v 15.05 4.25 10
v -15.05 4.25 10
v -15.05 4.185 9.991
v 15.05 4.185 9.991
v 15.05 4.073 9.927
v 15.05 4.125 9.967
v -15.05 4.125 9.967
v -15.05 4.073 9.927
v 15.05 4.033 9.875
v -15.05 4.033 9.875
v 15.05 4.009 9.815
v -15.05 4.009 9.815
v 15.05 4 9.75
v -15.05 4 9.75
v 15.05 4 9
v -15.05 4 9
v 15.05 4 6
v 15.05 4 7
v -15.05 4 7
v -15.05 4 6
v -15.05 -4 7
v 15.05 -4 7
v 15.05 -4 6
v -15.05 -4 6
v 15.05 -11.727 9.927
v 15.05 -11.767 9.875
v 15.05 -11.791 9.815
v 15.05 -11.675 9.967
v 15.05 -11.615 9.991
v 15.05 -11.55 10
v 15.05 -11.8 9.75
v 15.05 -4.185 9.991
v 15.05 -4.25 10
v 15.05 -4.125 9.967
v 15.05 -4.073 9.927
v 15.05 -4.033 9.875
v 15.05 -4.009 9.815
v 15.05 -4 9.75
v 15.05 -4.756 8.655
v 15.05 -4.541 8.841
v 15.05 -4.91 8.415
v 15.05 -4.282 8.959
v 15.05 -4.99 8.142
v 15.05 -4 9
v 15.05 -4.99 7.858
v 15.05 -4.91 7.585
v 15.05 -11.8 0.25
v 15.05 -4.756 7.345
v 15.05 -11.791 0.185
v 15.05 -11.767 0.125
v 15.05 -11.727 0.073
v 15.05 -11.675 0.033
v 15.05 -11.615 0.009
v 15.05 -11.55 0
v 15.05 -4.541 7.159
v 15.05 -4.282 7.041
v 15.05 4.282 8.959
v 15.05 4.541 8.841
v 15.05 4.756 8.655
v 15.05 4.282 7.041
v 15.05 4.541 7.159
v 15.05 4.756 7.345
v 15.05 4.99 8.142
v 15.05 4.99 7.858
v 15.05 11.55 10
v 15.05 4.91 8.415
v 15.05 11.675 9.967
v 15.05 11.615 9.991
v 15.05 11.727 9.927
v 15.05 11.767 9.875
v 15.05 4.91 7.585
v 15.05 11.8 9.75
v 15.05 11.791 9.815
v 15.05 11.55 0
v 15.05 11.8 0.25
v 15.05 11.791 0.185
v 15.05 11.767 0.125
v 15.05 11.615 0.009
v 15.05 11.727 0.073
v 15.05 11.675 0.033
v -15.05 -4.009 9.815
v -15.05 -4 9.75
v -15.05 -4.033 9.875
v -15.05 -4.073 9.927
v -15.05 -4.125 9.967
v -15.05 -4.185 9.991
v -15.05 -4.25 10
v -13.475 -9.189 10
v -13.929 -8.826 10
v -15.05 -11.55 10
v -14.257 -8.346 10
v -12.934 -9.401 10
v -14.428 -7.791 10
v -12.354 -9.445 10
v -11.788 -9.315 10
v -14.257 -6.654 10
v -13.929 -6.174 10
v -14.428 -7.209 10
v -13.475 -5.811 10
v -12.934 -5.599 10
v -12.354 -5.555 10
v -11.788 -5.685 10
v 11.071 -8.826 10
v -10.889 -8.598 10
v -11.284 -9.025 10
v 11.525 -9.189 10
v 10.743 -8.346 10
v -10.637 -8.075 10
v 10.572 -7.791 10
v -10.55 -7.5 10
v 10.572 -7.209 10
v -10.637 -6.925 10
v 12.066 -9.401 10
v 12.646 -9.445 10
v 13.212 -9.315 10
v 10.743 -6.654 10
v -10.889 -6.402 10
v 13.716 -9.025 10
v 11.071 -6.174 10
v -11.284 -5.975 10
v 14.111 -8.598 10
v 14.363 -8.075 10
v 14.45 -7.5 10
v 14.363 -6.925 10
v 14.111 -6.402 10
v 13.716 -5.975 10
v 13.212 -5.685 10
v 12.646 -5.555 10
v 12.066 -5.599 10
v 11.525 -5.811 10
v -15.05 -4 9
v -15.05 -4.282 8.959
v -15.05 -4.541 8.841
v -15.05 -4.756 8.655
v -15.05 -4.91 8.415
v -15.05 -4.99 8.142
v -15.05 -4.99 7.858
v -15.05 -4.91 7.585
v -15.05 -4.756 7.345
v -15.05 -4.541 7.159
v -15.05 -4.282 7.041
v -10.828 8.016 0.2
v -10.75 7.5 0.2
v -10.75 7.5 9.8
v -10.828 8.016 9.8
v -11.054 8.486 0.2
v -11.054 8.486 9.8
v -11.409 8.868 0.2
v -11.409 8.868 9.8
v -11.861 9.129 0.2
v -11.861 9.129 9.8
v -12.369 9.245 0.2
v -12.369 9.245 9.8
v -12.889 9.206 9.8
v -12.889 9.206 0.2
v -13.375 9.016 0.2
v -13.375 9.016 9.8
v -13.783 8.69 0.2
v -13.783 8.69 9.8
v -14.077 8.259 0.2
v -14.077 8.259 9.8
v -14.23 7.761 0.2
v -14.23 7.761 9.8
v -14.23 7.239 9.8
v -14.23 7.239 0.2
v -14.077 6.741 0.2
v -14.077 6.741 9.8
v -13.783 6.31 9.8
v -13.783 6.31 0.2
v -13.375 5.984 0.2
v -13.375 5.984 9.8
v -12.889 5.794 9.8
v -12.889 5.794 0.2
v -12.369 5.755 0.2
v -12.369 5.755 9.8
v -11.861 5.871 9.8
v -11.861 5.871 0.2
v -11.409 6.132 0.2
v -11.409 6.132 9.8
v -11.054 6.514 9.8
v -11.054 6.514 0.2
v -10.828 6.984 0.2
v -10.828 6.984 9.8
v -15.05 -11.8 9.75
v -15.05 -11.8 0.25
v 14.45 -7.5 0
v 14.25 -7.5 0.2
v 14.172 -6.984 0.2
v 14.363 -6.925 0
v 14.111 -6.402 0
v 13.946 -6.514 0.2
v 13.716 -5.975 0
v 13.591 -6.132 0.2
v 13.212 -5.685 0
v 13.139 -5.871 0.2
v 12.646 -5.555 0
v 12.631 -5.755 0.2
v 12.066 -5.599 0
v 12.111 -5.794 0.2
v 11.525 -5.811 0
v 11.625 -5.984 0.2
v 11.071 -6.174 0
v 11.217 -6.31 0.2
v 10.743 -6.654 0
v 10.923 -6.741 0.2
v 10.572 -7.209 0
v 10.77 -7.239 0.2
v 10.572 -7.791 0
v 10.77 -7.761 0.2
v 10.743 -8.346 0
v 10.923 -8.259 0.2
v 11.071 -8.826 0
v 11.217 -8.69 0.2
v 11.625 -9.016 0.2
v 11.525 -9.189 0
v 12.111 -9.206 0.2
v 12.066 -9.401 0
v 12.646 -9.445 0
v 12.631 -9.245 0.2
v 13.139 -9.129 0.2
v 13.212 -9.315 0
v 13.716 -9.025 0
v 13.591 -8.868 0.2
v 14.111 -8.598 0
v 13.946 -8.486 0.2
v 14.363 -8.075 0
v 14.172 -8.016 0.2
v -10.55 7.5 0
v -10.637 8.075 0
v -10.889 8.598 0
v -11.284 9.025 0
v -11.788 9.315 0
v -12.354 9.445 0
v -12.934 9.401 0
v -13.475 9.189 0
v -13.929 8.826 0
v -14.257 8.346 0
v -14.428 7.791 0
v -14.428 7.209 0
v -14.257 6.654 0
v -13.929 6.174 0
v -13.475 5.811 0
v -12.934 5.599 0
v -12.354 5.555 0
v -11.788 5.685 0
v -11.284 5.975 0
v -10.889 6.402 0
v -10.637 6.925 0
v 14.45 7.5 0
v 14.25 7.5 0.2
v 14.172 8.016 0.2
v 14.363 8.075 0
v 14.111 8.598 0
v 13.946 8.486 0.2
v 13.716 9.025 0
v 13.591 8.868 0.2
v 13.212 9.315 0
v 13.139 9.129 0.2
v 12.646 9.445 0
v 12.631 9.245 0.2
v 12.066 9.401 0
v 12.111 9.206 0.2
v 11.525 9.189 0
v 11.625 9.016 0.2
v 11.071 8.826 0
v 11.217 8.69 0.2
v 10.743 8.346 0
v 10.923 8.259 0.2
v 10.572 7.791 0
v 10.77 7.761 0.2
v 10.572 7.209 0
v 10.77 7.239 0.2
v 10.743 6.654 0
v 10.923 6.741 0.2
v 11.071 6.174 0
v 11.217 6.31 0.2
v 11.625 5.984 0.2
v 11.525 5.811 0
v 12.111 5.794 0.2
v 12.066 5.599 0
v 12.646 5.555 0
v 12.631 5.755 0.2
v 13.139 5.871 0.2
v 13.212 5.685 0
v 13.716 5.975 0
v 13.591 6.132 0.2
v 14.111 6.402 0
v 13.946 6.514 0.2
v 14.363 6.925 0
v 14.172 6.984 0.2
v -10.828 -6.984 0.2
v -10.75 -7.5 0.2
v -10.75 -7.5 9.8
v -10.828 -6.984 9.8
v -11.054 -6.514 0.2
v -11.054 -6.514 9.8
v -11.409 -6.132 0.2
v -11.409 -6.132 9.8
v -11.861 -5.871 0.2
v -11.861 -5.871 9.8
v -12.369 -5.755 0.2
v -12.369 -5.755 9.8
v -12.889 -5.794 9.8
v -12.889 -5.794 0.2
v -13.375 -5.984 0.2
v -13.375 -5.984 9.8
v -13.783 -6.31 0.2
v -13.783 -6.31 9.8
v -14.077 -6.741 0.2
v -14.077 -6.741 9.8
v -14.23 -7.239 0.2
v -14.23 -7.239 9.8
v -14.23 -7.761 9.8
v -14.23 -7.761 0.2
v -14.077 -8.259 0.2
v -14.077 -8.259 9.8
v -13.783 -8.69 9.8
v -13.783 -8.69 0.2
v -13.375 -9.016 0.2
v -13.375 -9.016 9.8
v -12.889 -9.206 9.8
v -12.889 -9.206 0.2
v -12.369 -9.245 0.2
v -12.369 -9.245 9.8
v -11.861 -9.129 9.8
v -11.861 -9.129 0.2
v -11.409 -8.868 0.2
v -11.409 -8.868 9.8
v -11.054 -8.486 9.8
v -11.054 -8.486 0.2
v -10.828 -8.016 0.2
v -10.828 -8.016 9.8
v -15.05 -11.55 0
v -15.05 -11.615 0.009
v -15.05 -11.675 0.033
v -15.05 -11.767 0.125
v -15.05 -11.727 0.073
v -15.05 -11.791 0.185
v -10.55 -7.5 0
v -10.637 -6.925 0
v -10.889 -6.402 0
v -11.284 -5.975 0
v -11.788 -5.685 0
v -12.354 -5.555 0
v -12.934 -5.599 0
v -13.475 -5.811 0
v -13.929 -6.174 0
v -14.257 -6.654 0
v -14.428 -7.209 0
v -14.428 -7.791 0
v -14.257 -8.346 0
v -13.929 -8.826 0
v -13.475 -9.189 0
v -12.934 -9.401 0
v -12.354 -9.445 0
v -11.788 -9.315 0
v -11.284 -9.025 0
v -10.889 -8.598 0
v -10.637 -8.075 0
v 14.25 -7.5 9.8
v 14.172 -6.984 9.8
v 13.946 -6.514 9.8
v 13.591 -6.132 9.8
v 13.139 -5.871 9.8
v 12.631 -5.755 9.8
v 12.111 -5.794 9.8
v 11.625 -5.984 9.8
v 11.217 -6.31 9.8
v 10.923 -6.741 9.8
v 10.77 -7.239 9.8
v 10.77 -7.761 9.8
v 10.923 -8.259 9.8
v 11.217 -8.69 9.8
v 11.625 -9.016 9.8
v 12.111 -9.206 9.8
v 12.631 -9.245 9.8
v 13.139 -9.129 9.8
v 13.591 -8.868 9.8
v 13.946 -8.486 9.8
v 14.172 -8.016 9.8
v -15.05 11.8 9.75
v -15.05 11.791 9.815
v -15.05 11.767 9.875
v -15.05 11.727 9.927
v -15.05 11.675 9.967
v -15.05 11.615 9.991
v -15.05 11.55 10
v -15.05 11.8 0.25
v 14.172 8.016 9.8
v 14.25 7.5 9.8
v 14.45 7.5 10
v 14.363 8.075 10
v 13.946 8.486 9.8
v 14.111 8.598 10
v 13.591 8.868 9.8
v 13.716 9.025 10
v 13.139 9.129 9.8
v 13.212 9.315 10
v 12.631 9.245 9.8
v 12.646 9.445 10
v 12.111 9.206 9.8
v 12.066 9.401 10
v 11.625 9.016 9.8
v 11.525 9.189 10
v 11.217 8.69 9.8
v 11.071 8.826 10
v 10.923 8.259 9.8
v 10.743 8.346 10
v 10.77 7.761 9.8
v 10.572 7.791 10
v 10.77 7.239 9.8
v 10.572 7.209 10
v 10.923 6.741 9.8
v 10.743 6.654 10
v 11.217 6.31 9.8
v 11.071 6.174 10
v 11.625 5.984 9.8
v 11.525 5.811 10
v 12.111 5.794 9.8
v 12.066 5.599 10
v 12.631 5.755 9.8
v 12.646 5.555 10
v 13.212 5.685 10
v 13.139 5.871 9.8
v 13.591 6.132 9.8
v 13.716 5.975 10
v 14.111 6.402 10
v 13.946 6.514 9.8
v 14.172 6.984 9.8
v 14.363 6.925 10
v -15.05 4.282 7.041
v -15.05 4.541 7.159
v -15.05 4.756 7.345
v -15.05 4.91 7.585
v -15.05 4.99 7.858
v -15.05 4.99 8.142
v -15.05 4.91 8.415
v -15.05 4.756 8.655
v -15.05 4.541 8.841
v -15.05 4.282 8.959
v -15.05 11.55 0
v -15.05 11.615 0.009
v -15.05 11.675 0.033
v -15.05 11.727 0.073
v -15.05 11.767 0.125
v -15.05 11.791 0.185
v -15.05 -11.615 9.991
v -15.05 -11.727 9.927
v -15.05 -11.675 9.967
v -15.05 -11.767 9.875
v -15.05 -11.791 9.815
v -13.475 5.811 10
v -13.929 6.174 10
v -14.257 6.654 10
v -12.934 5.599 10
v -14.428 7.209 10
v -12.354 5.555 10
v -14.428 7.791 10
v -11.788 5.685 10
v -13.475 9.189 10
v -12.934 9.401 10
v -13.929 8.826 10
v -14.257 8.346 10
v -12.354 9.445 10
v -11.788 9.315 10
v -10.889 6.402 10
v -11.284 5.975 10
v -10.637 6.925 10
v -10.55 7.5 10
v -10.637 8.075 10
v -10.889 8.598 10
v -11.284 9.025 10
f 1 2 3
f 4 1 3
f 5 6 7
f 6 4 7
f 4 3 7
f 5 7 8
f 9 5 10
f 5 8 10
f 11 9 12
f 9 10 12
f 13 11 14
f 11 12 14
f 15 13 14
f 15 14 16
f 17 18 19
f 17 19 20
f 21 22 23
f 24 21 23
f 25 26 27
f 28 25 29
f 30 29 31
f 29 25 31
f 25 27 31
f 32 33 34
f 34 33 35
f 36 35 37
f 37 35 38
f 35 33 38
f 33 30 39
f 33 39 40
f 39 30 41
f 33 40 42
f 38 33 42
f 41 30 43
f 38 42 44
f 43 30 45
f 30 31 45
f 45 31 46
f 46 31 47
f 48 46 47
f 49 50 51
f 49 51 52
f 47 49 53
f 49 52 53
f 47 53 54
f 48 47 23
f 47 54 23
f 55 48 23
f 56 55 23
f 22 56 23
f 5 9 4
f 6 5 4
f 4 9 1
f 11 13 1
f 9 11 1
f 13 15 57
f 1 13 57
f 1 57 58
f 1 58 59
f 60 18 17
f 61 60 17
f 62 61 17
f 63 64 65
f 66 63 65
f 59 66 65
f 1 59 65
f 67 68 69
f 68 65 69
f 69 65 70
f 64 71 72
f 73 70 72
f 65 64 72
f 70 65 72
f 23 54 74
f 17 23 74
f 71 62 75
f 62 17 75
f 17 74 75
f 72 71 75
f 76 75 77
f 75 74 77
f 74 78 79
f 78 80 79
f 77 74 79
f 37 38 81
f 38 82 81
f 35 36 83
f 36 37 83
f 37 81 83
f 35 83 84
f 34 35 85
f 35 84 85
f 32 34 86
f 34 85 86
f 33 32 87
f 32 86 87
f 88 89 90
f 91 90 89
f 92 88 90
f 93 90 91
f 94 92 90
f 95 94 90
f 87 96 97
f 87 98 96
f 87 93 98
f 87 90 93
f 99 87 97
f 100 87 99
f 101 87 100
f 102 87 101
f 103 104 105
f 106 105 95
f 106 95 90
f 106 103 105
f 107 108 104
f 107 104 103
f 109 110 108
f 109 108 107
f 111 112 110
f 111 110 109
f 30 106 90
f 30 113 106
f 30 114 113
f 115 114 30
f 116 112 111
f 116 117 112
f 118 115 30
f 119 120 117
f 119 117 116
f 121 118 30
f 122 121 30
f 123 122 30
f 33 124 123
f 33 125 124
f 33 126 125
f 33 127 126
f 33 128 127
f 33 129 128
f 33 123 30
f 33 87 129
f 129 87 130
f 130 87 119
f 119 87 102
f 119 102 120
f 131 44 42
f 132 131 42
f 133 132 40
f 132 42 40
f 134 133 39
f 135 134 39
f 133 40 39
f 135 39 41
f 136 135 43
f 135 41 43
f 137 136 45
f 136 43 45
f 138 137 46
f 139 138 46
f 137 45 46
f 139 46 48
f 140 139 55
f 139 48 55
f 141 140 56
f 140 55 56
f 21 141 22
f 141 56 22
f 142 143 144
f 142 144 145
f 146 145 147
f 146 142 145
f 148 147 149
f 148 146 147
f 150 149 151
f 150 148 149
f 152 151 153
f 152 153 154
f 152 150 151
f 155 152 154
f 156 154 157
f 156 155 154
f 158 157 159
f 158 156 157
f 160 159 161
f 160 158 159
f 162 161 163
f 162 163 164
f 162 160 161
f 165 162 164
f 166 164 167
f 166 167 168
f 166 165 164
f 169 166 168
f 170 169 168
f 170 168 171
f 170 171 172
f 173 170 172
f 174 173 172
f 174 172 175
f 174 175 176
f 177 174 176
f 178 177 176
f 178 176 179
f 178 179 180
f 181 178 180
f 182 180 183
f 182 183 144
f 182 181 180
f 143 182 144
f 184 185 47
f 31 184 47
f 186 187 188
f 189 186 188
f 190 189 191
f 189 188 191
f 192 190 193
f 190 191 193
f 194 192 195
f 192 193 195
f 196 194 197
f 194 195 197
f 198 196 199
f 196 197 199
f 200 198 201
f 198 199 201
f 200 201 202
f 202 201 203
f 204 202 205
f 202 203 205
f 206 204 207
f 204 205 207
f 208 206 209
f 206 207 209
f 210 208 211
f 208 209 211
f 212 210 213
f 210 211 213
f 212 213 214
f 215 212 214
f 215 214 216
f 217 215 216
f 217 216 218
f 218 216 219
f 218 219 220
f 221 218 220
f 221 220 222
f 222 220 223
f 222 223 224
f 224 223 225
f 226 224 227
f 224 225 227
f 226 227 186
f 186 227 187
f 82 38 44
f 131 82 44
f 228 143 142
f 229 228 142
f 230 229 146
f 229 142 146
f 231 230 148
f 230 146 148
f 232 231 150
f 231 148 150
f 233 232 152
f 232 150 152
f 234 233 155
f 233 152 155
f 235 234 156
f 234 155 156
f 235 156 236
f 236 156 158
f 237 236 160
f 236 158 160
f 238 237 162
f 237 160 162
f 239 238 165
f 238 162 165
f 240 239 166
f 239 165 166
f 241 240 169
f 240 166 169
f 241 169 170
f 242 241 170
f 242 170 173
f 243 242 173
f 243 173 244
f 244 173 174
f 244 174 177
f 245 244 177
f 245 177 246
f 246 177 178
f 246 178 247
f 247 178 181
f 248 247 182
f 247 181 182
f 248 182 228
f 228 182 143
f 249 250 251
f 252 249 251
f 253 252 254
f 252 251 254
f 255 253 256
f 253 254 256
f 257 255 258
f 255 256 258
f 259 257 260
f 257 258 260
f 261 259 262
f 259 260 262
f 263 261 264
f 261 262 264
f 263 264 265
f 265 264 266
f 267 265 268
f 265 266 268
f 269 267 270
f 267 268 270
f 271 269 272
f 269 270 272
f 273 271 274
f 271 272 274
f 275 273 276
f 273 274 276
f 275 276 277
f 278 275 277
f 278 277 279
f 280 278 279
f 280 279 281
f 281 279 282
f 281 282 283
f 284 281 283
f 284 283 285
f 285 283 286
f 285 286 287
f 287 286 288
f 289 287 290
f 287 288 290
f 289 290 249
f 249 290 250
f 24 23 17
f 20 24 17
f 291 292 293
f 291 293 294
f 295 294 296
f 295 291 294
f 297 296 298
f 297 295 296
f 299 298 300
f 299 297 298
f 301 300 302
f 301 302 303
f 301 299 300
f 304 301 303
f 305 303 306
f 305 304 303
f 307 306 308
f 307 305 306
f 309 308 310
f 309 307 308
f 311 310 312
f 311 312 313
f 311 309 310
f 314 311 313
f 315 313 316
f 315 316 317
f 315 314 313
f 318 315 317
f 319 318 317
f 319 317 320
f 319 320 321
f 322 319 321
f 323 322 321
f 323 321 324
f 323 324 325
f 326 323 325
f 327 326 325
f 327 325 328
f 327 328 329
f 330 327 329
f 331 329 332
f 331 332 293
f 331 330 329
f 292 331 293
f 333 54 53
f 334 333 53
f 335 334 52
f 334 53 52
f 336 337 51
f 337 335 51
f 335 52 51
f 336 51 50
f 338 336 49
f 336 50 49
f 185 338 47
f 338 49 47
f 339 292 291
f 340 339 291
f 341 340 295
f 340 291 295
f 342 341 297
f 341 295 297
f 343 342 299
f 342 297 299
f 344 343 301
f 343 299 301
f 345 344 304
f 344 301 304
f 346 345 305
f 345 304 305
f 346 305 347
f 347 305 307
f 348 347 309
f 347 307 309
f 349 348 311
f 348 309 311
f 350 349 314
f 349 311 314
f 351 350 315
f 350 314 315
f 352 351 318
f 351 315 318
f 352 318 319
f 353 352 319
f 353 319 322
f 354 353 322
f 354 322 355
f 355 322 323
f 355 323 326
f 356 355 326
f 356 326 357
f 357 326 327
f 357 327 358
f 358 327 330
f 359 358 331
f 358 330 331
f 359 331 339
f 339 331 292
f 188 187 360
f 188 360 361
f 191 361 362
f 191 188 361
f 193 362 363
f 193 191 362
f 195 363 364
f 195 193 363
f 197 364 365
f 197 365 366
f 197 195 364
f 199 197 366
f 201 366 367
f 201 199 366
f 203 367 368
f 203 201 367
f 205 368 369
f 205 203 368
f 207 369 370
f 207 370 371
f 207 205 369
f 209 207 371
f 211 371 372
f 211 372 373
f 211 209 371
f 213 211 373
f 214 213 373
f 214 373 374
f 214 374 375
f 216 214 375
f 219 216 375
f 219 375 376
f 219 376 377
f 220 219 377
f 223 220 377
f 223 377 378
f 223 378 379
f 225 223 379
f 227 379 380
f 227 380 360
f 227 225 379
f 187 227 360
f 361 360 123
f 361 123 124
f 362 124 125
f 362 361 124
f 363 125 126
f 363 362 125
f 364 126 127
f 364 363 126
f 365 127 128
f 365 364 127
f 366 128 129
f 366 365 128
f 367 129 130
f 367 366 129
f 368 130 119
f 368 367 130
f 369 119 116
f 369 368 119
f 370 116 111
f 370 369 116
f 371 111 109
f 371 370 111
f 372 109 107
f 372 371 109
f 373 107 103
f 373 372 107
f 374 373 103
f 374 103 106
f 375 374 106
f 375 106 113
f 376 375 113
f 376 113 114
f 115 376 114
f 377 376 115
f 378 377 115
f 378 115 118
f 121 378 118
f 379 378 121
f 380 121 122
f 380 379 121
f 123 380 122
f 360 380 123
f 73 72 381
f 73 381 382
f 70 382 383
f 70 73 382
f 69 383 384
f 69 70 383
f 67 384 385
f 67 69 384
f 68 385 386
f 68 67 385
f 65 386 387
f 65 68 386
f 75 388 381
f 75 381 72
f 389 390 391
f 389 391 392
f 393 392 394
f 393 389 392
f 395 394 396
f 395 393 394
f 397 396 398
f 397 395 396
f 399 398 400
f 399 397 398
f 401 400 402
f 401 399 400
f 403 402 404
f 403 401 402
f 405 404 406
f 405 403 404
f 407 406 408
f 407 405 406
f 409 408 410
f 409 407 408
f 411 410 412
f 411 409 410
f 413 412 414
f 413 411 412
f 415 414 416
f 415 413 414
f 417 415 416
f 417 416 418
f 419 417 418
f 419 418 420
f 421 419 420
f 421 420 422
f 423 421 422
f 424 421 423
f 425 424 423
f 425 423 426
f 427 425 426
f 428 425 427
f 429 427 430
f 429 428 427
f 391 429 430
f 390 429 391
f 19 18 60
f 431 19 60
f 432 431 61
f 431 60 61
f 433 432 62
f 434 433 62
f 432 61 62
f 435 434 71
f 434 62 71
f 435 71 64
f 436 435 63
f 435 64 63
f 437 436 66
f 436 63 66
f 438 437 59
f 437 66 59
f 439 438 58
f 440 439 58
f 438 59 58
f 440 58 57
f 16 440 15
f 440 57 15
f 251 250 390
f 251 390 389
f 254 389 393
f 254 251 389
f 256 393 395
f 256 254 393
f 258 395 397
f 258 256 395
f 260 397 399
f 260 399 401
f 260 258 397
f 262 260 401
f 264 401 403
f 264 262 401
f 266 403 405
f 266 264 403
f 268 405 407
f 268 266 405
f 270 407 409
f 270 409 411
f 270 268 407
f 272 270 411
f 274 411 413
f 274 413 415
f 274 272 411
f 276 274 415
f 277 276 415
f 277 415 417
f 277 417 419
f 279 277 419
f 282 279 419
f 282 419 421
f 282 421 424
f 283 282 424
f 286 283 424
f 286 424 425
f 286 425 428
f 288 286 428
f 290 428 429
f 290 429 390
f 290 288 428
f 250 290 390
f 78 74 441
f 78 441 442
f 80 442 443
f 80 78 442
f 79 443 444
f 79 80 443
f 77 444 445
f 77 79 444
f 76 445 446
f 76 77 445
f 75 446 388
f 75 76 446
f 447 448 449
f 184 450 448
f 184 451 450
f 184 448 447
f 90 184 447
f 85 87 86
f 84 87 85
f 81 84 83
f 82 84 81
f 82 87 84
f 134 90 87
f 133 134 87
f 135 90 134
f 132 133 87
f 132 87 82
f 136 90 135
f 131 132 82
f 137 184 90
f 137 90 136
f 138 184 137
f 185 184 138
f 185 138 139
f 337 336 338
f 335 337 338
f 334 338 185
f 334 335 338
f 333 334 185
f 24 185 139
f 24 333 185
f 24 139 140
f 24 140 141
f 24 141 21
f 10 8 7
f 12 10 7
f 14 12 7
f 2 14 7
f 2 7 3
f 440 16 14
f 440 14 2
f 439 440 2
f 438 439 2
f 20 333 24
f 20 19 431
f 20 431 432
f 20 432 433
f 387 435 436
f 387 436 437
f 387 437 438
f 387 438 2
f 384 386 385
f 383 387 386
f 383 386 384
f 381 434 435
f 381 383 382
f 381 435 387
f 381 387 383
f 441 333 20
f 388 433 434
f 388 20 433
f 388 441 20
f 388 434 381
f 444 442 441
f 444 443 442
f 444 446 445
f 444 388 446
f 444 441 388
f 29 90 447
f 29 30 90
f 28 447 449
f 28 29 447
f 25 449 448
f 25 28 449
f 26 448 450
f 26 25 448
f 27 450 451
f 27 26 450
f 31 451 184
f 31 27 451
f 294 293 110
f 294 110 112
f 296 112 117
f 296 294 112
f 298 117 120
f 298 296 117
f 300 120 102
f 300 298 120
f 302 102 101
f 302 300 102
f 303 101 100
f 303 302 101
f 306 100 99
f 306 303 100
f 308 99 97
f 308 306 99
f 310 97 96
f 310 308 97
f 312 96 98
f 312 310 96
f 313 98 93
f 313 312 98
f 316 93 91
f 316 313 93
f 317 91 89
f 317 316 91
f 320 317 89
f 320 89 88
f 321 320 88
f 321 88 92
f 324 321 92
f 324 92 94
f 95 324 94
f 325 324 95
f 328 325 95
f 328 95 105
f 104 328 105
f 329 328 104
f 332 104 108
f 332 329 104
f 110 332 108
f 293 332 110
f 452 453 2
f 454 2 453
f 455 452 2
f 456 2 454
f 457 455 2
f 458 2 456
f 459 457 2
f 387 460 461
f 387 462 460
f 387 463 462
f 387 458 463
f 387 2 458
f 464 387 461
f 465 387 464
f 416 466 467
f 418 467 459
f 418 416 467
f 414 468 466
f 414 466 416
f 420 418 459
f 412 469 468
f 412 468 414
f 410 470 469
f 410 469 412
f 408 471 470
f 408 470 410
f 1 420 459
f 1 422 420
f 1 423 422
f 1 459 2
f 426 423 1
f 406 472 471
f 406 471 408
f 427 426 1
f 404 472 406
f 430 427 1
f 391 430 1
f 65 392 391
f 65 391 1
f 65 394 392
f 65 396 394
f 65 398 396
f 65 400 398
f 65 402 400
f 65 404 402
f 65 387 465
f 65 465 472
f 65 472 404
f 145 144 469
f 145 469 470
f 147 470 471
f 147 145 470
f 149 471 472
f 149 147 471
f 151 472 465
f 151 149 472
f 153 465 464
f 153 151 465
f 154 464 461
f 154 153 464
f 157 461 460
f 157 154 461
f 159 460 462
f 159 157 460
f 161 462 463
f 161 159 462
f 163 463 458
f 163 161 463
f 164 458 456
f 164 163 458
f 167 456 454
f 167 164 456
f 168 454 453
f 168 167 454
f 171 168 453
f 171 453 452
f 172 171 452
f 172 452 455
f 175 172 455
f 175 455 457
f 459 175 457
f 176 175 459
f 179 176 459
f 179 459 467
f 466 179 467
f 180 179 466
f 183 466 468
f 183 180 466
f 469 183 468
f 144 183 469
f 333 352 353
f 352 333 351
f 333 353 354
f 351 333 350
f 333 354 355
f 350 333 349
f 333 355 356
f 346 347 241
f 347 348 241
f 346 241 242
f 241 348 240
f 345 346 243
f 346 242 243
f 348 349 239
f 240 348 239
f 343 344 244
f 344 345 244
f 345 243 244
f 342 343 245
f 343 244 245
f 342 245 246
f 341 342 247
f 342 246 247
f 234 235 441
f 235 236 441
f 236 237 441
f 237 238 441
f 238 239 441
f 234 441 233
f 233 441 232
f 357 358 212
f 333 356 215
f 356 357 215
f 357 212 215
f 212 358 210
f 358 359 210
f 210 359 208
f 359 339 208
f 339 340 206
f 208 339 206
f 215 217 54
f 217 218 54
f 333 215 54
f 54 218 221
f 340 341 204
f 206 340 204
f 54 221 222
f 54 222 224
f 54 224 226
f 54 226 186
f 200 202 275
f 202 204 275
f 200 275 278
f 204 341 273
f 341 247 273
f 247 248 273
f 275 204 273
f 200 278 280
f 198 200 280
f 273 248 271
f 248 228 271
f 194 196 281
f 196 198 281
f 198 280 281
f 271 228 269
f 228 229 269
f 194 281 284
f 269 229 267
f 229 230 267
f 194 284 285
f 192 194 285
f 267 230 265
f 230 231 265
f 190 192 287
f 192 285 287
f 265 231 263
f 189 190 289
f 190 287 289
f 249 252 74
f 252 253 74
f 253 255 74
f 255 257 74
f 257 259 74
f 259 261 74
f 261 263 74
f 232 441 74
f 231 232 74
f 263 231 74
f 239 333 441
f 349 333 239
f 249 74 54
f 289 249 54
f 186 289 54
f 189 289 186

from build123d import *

# Parameters (mm, degrees)
SKETCH1_W           = 45
SKETCH1_H           = 23.6
SKETCH1_R           = 1.75
BOSS_EXTRUDE1_DEPTH = 10
SKETCH2_R           = 1
SKETCH2_W           = 4
SKETCH2_H           = 8
CUT_EXTRUDE1_DEPTH  = 46
FILLET1_R           = 0.25
CHAMFER1_SIZE       = 0.2
SKETCH3_W           = 11.00513931
SKETCH3_H           = 32.516866569
SKETCH3_W_2         = 10
SKETCH3_H_2         = 36.117344973
CUT_EXTRUDE2_DEPTH  = 10


with BuildPart() as part:
    # Sketch1 → Boss-Extrude1 (new body)
    with BuildSketch(Plane.XY):
        Rectangle(SKETCH1_W, SKETCH1_H)
        with Locations((-12.5, 7.5)):
            Circle(SKETCH1_R, mode=Mode.SUBTRACT)
        with Locations((12.5, 7.5)):
            Circle(SKETCH1_R, mode=Mode.SUBTRACT)
        with Locations((12.5, -7.5)):
            Circle(SKETCH1_R, mode=Mode.SUBTRACT)
        with Locations((-12.5, -7.5)):
            Circle(SKETCH1_R, mode=Mode.SUBTRACT)
    extrude(amount=BOSS_EXTRUDE1_DEPTH)

    # Sketch2 → Cut-Extrude1 (cut, through all)
    with BuildSketch(Plane(origin=(22.5, 0, 0), x_dir=(0, 0, -1), z_dir=(1, 0, 0))):
        with Locations((-8, 4)):
            Circle(SKETCH2_R)
        with Locations((-8, -4)):
            Circle(SKETCH2_R)
        with Locations((-8, 0)):
            Rectangle(SKETCH2_W, SKETCH2_H)
    extrude(amount=-CUT_EXTRUDE1_DEPTH, mode=Mode.SUBTRACT)

    # Fillet1
    fillet1_edges = [part.edges().sort_by_distance(p)[0] for p in [
        (22.5, -7.9, 10),
        (0, 11.8, 10),
        (22.5, 7.9, 10),
        (-22.5, -7.9, 10),
        (0, -4, 10),
        (-22.5, 7.9, 10),
        (0, 4, 10),
        (0, 11.8, 0),
        (22.5, 0, 0),
        (0, -11.8, 0),
        (-22.5, 0, 0),
        (0, -11.8, 10),
        (-22.5, 11.8, 5),
        (22.5, 11.8, 5),
        (22.5, -11.8, 5),
        (-22.5, -11.8, 5),
    ]]
    fillet(fillet1_edges, radius=FILLET1_R)

    # Chamfer1
    chamfer1_edges = [part.edges().sort_by_distance(p)[0] for p in [
        (-14.25, 7.5, 0),
        (-14.25, 7.5, 10),
        (10.75, 7.5, 0),
        (10.75, 7.5, 10),
        (10.75, -7.5, 0),
        (10.75, -7.5, 10),
        (-14.25, -7.5, 0),
        (-14.25, -7.5, 10),
    ]]
    chamfer(chamfer1_edges, length=CHAMFER1_SIZE)

    # Sketch3 → Cut-Extrude2 (cut)
    with BuildSketch(Plane(origin=(0, 0, 0), x_dir=(-1, 0, 0), z_dir=(0, 0, -1))):
        with Locations((-20.552569655, 1.232790519)):
            Rectangle(SKETCH3_W, SKETCH3_H)
        with Locations((20.05, -0.567448683)):
            Rectangle(SKETCH3_W_2, SKETCH3_H_2)
    extrude(amount=-CUT_EXTRUDE2_DEPTH, mode=Mode.SUBTRACT)


solid = part.part
